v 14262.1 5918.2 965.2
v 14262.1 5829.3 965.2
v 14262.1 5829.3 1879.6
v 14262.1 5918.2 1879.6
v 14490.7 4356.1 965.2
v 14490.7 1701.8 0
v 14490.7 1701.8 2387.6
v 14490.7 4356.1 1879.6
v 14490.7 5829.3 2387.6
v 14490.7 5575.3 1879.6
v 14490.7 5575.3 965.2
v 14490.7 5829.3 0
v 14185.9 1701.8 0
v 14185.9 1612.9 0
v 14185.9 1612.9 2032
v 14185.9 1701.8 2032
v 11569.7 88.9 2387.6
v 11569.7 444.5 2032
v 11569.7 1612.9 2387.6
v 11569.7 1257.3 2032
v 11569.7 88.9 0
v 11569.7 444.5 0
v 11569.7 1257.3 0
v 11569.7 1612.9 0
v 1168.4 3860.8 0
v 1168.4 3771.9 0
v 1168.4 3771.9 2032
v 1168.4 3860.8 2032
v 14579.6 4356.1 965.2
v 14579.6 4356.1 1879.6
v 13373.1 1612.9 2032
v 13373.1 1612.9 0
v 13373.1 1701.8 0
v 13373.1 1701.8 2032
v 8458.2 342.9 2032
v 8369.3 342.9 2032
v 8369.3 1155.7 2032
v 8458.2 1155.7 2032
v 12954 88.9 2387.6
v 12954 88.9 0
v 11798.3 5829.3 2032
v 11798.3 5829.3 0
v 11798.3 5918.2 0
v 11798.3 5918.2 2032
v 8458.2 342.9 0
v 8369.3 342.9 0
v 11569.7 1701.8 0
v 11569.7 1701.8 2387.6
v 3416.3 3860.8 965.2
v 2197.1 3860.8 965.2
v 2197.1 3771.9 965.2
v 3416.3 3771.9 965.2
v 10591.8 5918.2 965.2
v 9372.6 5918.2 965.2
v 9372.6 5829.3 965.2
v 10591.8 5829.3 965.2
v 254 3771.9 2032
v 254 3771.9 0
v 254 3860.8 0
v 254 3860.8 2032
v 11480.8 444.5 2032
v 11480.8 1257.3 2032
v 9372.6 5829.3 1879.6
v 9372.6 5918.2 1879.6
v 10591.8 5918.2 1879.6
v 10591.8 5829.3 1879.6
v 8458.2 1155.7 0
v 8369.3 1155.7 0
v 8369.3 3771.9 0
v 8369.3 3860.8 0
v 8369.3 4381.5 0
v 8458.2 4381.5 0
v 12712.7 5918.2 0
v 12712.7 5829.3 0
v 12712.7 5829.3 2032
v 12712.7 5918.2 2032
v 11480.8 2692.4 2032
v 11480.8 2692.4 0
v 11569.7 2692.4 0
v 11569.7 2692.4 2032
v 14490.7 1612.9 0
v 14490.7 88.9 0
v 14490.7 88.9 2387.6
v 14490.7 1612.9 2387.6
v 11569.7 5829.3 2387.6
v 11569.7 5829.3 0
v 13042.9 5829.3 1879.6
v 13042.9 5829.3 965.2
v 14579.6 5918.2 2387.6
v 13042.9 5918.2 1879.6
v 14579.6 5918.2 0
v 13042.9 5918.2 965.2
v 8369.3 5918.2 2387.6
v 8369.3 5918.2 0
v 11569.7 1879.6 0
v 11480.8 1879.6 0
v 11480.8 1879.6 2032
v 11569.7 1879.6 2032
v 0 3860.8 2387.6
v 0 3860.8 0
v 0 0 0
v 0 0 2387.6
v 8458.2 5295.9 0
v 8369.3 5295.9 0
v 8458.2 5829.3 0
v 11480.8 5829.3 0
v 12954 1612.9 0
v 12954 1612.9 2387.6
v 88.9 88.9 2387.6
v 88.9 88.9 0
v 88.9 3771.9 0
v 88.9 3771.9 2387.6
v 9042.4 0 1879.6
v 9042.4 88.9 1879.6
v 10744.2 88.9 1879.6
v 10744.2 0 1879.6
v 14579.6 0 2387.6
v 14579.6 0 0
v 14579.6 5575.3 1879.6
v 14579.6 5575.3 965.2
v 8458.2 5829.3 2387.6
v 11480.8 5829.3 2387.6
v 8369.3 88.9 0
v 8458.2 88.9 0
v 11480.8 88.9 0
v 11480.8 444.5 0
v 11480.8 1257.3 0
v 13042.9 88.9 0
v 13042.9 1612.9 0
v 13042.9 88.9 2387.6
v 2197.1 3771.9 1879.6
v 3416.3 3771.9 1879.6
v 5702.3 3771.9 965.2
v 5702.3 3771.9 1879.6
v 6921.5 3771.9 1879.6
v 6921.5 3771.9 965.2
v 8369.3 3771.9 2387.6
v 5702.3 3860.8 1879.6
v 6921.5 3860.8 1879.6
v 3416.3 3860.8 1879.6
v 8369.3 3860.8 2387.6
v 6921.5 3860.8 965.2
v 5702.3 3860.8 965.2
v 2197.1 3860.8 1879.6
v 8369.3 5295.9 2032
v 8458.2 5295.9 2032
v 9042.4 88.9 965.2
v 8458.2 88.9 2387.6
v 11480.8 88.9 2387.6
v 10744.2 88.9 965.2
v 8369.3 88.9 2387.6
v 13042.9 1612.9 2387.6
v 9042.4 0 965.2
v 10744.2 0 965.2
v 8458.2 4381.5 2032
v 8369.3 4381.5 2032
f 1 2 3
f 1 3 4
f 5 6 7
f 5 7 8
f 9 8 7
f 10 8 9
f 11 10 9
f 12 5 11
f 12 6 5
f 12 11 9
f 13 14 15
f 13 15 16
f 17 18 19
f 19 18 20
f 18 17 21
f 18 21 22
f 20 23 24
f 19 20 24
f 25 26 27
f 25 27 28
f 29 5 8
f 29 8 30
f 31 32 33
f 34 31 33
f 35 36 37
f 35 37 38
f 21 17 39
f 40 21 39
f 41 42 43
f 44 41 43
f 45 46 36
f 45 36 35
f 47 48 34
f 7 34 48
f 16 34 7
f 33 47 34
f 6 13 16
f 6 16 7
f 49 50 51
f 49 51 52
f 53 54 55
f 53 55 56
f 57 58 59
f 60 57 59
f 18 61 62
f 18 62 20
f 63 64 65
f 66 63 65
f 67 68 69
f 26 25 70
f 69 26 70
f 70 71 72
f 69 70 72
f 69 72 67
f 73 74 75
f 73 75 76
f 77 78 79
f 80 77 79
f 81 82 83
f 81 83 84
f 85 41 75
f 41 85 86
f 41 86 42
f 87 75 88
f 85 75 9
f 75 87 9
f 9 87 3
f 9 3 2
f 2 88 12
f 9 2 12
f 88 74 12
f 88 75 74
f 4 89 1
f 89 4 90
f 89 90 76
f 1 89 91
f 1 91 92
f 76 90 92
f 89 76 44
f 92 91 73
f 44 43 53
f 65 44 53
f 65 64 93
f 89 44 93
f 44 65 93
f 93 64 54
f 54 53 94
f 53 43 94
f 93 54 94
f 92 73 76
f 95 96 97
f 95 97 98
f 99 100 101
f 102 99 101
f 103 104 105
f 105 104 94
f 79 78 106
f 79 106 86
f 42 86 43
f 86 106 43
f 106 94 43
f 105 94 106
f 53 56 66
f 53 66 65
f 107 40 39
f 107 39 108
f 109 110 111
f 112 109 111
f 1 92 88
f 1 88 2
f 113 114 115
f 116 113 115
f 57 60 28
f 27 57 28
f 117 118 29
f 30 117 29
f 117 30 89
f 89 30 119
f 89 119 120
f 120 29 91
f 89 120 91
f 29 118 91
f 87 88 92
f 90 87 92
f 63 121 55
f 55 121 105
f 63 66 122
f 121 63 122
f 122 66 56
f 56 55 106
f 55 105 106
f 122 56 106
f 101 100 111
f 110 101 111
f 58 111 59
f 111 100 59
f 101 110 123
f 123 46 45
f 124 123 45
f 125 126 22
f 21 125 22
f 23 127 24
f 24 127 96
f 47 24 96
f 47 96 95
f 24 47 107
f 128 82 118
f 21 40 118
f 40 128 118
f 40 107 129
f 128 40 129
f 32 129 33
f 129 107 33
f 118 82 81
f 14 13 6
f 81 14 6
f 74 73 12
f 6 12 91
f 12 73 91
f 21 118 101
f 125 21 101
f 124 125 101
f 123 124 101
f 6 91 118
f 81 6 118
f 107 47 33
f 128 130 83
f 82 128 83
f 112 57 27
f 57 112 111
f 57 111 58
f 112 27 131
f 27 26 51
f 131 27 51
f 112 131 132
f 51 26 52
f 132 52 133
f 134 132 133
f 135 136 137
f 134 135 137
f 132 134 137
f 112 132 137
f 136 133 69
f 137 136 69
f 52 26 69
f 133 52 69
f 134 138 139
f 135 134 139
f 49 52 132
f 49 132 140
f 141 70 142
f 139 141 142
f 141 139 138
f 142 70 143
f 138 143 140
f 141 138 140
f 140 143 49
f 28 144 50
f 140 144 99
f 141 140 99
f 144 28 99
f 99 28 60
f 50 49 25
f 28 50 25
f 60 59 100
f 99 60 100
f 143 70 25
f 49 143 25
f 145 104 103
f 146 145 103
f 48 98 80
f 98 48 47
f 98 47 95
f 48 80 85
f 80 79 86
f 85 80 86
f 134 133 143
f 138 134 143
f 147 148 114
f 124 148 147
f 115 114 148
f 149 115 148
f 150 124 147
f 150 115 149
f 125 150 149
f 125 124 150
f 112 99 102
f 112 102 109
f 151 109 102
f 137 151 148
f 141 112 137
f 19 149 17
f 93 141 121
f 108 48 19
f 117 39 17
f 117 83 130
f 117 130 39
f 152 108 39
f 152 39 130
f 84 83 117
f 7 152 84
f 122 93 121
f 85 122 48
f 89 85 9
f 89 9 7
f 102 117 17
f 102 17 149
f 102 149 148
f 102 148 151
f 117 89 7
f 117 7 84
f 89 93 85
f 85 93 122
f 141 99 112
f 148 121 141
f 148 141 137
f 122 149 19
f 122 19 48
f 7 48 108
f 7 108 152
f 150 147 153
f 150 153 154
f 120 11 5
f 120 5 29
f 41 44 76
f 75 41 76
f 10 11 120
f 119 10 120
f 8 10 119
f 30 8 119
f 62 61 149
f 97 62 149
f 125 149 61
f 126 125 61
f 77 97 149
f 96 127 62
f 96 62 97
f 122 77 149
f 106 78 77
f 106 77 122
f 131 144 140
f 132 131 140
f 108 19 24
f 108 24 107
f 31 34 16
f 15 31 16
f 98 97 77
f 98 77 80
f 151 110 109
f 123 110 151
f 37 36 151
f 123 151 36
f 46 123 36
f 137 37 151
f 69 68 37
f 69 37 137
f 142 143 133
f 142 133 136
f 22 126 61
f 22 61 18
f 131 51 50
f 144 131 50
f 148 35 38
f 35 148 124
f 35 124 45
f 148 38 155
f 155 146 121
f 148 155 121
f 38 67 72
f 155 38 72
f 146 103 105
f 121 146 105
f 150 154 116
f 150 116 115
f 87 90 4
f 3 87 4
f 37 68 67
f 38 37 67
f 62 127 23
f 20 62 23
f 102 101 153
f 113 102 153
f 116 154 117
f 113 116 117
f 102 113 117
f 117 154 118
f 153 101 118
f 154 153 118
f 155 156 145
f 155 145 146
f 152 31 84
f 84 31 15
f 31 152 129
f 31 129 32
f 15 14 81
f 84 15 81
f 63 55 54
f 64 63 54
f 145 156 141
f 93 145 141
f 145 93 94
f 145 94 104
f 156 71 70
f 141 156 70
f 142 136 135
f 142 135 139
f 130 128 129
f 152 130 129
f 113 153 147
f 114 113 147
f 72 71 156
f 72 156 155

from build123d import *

# Parameters (mm, degrees)
F0_W     = 8280.4
F0_H     = 3683
F0_W_2   = 1384.3
F0_H_2   = 1524
F0_W_3   = 1447.8
F0_W_4   = 3022.6
F0_H_3   = 5740.4
F0_W_5   = 2921
F0_H_4   = 4127.5
F1_DEPTH = 2387.6
F2_W     = 914.4
F2_H     = 88.9
F2_W_2   = 88.9
F2_H_2   = 812.8
F2_H_3   = 914.4
F2_W_3   = 812.8
F3_DEPTH = 2032
F5_W     = 1219.2
F5_H     = 88.9
F5_W_2   = 88.9
F5_H_2   = 1219.2
F5_W_3   = 1701.8
F7_DEPTH = 914.4


# Not quite as in the source:
# - a feature of the source that left no trace in its solid (it failed there, or was rolled back) is left out


with BuildPart() as f1:
    # F0 (on Top) → F1 (new body)
    with BuildSketch(Plane.XY):
        Polygon((0, 3860.8), (0, 0), (14579.6, 0), (14579.6, 5918.2), (8369.3, 5918.2), (8369.3, 3860.8), align=None)
        with Locations((4229.1, 1930.4)):
            Rectangle(F0_W, F0_H, mode=Mode.SUBTRACT)
        with Locations((12261.85, 850.9)):
            Rectangle(F0_W_2, F0_H_2, mode=Mode.SUBTRACT)
        with Locations((13766.8, 850.9)):
            Rectangle(F0_W_3, F0_H_2, mode=Mode.SUBTRACT)
        with Locations((9969.5, 2959.1)):
            Rectangle(F0_W_4, F0_H_3, mode=Mode.SUBTRACT)
        with Locations((13030.2, 3765.55)):
            Rectangle(F0_W_5, F0_H_4, mode=Mode.SUBTRACT)
    extrude(amount=F1_DEPTH)

    # F2 (on Top) → F3 (cut)
    with BuildSketch(Plane.XY):
        with Locations((711.2, 3816.35)):
            Rectangle(F2_W, F2_H)
        with Locations((8413.75, 749.3)):
            Rectangle(F2_W_2, F2_H_2)
        with Locations((8413.75, 4838.7)):
            Rectangle(F2_W_2, F2_H_3)
        with Locations((12255.5, 5873.75)):
            Rectangle(F2_W, F2_H)
        with Locations((11525.25, 850.9)):
            Rectangle(F2_W_2, F2_H_2)
        with Locations((13779.5, 1657.35)):
            Rectangle(F2_W_3, F2_H)
        with Locations((11525.25, 2286)):
            Rectangle(F2_W_2, F2_H_2)
    extrude(amount=F3_DEPTH, mode=Mode.SUBTRACT)

    # F5 (on offset) → F7 (cut, through all)
    with BuildSketch(Plane.XY.offset(965.2)):
        with Locations((2806.7, 3816.35)):
            Rectangle(F5_W, F5_H)
        with Locations((6311.9, 3816.35)):
            Rectangle(F5_W, F5_H)
        with Locations((9982.2, 5873.75)):
            Rectangle(F5_W, F5_H)
        with Locations((13652.5, 5873.75)):
            Rectangle(F5_W, F5_H)
        with Locations((14535.15, 4965.7)):
            Rectangle(F5_W_2, F5_H_2)
        with Locations((9893.3, 44.45)):
            Rectangle(F5_W_3, F5_H)
    extrude(amount=F7_DEPTH, mode=Mode.SUBTRACT)


solid = f1.part
